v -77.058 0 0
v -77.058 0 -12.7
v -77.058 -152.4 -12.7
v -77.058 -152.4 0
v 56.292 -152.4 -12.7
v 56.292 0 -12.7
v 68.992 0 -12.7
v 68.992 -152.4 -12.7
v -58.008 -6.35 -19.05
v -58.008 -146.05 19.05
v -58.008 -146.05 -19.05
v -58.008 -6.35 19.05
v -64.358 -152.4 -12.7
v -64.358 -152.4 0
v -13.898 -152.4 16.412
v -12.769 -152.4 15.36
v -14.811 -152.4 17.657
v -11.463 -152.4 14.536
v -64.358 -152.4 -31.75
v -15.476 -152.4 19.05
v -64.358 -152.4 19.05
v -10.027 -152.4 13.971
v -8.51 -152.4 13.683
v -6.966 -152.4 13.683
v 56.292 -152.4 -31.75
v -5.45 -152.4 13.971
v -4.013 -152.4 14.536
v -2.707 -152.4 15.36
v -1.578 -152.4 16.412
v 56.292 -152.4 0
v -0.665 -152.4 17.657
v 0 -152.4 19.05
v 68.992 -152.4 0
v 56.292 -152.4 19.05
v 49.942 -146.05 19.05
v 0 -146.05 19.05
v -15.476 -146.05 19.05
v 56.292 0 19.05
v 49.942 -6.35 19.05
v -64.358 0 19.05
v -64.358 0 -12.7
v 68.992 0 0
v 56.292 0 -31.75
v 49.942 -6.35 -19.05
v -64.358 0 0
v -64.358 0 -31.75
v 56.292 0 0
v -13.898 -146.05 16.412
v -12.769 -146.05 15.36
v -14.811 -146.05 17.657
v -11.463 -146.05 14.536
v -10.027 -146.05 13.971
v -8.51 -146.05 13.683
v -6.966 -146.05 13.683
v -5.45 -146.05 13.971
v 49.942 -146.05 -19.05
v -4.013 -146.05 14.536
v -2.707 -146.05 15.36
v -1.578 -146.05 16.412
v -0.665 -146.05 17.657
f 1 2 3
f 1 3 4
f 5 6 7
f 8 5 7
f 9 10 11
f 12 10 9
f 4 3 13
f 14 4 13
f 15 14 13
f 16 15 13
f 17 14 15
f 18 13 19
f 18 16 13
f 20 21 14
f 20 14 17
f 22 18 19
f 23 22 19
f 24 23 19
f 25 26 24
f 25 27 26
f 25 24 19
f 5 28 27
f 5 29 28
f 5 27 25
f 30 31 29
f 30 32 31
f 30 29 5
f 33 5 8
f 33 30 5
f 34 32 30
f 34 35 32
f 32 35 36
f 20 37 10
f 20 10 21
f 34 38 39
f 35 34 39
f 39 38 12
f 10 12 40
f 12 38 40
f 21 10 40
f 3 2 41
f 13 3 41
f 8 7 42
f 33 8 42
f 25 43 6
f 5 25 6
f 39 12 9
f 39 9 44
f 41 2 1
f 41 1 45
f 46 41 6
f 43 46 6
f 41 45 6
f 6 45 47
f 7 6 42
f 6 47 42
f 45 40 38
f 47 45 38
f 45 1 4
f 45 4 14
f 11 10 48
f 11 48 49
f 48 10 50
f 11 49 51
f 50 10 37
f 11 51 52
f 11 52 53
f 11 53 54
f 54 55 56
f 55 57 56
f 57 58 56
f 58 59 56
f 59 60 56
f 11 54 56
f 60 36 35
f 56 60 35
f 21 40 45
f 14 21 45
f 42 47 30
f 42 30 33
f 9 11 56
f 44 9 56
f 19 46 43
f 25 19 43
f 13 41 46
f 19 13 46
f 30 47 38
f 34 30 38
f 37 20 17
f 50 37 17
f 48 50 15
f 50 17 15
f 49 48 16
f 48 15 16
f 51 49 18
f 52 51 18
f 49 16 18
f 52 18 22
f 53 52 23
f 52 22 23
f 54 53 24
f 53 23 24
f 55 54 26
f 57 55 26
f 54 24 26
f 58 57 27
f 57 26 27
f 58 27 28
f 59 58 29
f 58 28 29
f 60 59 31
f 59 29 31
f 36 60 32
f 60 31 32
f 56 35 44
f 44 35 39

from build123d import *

# Parameters (mm, degrees)
F0_W     = 12.7
F0_H     = 12.7
F1_DEPTH = 152.4
F2_W     = 107.95
F2_H     = 139.7
F3_DEPTH = 38.1
F5_DEPTH = 6.35


with BuildPart() as f1:
    # F0 (on Front) → F1 (new body)
    with BuildSketch(Plane.XZ):
        Polygon((56.291819, 19.05), (-64.358181, 19.05), (-64.358181, 0), (-64.358181, -12.7), (-64.358181, -31.75), (56.291819, -31.75), (56.291819, -12.7), (56.291819, 0), align=None)
        with Locations((-70.708181, -6.35)):
            Rectangle(F0_W, F0_H)
        with Locations((62.641819, -6.35)):
            Rectangle(F0_W, F0_H)
    extrude(amount=F1_DEPTH)

    # F2 (on face) → F3 (cut)
    with BuildSketch(Plane.XY.offset(19.05)):
        with Locations((-4.033181, -76.2)):
            Rectangle(F2_W, F2_H)
    extrude(amount=-F3_DEPTH, mode=Mode.SUBTRACT)

    # F4 (on face) → F5 (cut)
    with BuildSketch(Plane.XZ.offset(152.4)):
        with BuildLine():
            Line((0, 19.05), (-15.476204, 19.05))
            ThreePointArc((-15.476204, 19.05), (-7.738102, 13.646425), (0, 19.05))
        make_face()
    extrude(amount=-F5_DEPTH, mode=Mode.SUBTRACT)


solid = f1.part
